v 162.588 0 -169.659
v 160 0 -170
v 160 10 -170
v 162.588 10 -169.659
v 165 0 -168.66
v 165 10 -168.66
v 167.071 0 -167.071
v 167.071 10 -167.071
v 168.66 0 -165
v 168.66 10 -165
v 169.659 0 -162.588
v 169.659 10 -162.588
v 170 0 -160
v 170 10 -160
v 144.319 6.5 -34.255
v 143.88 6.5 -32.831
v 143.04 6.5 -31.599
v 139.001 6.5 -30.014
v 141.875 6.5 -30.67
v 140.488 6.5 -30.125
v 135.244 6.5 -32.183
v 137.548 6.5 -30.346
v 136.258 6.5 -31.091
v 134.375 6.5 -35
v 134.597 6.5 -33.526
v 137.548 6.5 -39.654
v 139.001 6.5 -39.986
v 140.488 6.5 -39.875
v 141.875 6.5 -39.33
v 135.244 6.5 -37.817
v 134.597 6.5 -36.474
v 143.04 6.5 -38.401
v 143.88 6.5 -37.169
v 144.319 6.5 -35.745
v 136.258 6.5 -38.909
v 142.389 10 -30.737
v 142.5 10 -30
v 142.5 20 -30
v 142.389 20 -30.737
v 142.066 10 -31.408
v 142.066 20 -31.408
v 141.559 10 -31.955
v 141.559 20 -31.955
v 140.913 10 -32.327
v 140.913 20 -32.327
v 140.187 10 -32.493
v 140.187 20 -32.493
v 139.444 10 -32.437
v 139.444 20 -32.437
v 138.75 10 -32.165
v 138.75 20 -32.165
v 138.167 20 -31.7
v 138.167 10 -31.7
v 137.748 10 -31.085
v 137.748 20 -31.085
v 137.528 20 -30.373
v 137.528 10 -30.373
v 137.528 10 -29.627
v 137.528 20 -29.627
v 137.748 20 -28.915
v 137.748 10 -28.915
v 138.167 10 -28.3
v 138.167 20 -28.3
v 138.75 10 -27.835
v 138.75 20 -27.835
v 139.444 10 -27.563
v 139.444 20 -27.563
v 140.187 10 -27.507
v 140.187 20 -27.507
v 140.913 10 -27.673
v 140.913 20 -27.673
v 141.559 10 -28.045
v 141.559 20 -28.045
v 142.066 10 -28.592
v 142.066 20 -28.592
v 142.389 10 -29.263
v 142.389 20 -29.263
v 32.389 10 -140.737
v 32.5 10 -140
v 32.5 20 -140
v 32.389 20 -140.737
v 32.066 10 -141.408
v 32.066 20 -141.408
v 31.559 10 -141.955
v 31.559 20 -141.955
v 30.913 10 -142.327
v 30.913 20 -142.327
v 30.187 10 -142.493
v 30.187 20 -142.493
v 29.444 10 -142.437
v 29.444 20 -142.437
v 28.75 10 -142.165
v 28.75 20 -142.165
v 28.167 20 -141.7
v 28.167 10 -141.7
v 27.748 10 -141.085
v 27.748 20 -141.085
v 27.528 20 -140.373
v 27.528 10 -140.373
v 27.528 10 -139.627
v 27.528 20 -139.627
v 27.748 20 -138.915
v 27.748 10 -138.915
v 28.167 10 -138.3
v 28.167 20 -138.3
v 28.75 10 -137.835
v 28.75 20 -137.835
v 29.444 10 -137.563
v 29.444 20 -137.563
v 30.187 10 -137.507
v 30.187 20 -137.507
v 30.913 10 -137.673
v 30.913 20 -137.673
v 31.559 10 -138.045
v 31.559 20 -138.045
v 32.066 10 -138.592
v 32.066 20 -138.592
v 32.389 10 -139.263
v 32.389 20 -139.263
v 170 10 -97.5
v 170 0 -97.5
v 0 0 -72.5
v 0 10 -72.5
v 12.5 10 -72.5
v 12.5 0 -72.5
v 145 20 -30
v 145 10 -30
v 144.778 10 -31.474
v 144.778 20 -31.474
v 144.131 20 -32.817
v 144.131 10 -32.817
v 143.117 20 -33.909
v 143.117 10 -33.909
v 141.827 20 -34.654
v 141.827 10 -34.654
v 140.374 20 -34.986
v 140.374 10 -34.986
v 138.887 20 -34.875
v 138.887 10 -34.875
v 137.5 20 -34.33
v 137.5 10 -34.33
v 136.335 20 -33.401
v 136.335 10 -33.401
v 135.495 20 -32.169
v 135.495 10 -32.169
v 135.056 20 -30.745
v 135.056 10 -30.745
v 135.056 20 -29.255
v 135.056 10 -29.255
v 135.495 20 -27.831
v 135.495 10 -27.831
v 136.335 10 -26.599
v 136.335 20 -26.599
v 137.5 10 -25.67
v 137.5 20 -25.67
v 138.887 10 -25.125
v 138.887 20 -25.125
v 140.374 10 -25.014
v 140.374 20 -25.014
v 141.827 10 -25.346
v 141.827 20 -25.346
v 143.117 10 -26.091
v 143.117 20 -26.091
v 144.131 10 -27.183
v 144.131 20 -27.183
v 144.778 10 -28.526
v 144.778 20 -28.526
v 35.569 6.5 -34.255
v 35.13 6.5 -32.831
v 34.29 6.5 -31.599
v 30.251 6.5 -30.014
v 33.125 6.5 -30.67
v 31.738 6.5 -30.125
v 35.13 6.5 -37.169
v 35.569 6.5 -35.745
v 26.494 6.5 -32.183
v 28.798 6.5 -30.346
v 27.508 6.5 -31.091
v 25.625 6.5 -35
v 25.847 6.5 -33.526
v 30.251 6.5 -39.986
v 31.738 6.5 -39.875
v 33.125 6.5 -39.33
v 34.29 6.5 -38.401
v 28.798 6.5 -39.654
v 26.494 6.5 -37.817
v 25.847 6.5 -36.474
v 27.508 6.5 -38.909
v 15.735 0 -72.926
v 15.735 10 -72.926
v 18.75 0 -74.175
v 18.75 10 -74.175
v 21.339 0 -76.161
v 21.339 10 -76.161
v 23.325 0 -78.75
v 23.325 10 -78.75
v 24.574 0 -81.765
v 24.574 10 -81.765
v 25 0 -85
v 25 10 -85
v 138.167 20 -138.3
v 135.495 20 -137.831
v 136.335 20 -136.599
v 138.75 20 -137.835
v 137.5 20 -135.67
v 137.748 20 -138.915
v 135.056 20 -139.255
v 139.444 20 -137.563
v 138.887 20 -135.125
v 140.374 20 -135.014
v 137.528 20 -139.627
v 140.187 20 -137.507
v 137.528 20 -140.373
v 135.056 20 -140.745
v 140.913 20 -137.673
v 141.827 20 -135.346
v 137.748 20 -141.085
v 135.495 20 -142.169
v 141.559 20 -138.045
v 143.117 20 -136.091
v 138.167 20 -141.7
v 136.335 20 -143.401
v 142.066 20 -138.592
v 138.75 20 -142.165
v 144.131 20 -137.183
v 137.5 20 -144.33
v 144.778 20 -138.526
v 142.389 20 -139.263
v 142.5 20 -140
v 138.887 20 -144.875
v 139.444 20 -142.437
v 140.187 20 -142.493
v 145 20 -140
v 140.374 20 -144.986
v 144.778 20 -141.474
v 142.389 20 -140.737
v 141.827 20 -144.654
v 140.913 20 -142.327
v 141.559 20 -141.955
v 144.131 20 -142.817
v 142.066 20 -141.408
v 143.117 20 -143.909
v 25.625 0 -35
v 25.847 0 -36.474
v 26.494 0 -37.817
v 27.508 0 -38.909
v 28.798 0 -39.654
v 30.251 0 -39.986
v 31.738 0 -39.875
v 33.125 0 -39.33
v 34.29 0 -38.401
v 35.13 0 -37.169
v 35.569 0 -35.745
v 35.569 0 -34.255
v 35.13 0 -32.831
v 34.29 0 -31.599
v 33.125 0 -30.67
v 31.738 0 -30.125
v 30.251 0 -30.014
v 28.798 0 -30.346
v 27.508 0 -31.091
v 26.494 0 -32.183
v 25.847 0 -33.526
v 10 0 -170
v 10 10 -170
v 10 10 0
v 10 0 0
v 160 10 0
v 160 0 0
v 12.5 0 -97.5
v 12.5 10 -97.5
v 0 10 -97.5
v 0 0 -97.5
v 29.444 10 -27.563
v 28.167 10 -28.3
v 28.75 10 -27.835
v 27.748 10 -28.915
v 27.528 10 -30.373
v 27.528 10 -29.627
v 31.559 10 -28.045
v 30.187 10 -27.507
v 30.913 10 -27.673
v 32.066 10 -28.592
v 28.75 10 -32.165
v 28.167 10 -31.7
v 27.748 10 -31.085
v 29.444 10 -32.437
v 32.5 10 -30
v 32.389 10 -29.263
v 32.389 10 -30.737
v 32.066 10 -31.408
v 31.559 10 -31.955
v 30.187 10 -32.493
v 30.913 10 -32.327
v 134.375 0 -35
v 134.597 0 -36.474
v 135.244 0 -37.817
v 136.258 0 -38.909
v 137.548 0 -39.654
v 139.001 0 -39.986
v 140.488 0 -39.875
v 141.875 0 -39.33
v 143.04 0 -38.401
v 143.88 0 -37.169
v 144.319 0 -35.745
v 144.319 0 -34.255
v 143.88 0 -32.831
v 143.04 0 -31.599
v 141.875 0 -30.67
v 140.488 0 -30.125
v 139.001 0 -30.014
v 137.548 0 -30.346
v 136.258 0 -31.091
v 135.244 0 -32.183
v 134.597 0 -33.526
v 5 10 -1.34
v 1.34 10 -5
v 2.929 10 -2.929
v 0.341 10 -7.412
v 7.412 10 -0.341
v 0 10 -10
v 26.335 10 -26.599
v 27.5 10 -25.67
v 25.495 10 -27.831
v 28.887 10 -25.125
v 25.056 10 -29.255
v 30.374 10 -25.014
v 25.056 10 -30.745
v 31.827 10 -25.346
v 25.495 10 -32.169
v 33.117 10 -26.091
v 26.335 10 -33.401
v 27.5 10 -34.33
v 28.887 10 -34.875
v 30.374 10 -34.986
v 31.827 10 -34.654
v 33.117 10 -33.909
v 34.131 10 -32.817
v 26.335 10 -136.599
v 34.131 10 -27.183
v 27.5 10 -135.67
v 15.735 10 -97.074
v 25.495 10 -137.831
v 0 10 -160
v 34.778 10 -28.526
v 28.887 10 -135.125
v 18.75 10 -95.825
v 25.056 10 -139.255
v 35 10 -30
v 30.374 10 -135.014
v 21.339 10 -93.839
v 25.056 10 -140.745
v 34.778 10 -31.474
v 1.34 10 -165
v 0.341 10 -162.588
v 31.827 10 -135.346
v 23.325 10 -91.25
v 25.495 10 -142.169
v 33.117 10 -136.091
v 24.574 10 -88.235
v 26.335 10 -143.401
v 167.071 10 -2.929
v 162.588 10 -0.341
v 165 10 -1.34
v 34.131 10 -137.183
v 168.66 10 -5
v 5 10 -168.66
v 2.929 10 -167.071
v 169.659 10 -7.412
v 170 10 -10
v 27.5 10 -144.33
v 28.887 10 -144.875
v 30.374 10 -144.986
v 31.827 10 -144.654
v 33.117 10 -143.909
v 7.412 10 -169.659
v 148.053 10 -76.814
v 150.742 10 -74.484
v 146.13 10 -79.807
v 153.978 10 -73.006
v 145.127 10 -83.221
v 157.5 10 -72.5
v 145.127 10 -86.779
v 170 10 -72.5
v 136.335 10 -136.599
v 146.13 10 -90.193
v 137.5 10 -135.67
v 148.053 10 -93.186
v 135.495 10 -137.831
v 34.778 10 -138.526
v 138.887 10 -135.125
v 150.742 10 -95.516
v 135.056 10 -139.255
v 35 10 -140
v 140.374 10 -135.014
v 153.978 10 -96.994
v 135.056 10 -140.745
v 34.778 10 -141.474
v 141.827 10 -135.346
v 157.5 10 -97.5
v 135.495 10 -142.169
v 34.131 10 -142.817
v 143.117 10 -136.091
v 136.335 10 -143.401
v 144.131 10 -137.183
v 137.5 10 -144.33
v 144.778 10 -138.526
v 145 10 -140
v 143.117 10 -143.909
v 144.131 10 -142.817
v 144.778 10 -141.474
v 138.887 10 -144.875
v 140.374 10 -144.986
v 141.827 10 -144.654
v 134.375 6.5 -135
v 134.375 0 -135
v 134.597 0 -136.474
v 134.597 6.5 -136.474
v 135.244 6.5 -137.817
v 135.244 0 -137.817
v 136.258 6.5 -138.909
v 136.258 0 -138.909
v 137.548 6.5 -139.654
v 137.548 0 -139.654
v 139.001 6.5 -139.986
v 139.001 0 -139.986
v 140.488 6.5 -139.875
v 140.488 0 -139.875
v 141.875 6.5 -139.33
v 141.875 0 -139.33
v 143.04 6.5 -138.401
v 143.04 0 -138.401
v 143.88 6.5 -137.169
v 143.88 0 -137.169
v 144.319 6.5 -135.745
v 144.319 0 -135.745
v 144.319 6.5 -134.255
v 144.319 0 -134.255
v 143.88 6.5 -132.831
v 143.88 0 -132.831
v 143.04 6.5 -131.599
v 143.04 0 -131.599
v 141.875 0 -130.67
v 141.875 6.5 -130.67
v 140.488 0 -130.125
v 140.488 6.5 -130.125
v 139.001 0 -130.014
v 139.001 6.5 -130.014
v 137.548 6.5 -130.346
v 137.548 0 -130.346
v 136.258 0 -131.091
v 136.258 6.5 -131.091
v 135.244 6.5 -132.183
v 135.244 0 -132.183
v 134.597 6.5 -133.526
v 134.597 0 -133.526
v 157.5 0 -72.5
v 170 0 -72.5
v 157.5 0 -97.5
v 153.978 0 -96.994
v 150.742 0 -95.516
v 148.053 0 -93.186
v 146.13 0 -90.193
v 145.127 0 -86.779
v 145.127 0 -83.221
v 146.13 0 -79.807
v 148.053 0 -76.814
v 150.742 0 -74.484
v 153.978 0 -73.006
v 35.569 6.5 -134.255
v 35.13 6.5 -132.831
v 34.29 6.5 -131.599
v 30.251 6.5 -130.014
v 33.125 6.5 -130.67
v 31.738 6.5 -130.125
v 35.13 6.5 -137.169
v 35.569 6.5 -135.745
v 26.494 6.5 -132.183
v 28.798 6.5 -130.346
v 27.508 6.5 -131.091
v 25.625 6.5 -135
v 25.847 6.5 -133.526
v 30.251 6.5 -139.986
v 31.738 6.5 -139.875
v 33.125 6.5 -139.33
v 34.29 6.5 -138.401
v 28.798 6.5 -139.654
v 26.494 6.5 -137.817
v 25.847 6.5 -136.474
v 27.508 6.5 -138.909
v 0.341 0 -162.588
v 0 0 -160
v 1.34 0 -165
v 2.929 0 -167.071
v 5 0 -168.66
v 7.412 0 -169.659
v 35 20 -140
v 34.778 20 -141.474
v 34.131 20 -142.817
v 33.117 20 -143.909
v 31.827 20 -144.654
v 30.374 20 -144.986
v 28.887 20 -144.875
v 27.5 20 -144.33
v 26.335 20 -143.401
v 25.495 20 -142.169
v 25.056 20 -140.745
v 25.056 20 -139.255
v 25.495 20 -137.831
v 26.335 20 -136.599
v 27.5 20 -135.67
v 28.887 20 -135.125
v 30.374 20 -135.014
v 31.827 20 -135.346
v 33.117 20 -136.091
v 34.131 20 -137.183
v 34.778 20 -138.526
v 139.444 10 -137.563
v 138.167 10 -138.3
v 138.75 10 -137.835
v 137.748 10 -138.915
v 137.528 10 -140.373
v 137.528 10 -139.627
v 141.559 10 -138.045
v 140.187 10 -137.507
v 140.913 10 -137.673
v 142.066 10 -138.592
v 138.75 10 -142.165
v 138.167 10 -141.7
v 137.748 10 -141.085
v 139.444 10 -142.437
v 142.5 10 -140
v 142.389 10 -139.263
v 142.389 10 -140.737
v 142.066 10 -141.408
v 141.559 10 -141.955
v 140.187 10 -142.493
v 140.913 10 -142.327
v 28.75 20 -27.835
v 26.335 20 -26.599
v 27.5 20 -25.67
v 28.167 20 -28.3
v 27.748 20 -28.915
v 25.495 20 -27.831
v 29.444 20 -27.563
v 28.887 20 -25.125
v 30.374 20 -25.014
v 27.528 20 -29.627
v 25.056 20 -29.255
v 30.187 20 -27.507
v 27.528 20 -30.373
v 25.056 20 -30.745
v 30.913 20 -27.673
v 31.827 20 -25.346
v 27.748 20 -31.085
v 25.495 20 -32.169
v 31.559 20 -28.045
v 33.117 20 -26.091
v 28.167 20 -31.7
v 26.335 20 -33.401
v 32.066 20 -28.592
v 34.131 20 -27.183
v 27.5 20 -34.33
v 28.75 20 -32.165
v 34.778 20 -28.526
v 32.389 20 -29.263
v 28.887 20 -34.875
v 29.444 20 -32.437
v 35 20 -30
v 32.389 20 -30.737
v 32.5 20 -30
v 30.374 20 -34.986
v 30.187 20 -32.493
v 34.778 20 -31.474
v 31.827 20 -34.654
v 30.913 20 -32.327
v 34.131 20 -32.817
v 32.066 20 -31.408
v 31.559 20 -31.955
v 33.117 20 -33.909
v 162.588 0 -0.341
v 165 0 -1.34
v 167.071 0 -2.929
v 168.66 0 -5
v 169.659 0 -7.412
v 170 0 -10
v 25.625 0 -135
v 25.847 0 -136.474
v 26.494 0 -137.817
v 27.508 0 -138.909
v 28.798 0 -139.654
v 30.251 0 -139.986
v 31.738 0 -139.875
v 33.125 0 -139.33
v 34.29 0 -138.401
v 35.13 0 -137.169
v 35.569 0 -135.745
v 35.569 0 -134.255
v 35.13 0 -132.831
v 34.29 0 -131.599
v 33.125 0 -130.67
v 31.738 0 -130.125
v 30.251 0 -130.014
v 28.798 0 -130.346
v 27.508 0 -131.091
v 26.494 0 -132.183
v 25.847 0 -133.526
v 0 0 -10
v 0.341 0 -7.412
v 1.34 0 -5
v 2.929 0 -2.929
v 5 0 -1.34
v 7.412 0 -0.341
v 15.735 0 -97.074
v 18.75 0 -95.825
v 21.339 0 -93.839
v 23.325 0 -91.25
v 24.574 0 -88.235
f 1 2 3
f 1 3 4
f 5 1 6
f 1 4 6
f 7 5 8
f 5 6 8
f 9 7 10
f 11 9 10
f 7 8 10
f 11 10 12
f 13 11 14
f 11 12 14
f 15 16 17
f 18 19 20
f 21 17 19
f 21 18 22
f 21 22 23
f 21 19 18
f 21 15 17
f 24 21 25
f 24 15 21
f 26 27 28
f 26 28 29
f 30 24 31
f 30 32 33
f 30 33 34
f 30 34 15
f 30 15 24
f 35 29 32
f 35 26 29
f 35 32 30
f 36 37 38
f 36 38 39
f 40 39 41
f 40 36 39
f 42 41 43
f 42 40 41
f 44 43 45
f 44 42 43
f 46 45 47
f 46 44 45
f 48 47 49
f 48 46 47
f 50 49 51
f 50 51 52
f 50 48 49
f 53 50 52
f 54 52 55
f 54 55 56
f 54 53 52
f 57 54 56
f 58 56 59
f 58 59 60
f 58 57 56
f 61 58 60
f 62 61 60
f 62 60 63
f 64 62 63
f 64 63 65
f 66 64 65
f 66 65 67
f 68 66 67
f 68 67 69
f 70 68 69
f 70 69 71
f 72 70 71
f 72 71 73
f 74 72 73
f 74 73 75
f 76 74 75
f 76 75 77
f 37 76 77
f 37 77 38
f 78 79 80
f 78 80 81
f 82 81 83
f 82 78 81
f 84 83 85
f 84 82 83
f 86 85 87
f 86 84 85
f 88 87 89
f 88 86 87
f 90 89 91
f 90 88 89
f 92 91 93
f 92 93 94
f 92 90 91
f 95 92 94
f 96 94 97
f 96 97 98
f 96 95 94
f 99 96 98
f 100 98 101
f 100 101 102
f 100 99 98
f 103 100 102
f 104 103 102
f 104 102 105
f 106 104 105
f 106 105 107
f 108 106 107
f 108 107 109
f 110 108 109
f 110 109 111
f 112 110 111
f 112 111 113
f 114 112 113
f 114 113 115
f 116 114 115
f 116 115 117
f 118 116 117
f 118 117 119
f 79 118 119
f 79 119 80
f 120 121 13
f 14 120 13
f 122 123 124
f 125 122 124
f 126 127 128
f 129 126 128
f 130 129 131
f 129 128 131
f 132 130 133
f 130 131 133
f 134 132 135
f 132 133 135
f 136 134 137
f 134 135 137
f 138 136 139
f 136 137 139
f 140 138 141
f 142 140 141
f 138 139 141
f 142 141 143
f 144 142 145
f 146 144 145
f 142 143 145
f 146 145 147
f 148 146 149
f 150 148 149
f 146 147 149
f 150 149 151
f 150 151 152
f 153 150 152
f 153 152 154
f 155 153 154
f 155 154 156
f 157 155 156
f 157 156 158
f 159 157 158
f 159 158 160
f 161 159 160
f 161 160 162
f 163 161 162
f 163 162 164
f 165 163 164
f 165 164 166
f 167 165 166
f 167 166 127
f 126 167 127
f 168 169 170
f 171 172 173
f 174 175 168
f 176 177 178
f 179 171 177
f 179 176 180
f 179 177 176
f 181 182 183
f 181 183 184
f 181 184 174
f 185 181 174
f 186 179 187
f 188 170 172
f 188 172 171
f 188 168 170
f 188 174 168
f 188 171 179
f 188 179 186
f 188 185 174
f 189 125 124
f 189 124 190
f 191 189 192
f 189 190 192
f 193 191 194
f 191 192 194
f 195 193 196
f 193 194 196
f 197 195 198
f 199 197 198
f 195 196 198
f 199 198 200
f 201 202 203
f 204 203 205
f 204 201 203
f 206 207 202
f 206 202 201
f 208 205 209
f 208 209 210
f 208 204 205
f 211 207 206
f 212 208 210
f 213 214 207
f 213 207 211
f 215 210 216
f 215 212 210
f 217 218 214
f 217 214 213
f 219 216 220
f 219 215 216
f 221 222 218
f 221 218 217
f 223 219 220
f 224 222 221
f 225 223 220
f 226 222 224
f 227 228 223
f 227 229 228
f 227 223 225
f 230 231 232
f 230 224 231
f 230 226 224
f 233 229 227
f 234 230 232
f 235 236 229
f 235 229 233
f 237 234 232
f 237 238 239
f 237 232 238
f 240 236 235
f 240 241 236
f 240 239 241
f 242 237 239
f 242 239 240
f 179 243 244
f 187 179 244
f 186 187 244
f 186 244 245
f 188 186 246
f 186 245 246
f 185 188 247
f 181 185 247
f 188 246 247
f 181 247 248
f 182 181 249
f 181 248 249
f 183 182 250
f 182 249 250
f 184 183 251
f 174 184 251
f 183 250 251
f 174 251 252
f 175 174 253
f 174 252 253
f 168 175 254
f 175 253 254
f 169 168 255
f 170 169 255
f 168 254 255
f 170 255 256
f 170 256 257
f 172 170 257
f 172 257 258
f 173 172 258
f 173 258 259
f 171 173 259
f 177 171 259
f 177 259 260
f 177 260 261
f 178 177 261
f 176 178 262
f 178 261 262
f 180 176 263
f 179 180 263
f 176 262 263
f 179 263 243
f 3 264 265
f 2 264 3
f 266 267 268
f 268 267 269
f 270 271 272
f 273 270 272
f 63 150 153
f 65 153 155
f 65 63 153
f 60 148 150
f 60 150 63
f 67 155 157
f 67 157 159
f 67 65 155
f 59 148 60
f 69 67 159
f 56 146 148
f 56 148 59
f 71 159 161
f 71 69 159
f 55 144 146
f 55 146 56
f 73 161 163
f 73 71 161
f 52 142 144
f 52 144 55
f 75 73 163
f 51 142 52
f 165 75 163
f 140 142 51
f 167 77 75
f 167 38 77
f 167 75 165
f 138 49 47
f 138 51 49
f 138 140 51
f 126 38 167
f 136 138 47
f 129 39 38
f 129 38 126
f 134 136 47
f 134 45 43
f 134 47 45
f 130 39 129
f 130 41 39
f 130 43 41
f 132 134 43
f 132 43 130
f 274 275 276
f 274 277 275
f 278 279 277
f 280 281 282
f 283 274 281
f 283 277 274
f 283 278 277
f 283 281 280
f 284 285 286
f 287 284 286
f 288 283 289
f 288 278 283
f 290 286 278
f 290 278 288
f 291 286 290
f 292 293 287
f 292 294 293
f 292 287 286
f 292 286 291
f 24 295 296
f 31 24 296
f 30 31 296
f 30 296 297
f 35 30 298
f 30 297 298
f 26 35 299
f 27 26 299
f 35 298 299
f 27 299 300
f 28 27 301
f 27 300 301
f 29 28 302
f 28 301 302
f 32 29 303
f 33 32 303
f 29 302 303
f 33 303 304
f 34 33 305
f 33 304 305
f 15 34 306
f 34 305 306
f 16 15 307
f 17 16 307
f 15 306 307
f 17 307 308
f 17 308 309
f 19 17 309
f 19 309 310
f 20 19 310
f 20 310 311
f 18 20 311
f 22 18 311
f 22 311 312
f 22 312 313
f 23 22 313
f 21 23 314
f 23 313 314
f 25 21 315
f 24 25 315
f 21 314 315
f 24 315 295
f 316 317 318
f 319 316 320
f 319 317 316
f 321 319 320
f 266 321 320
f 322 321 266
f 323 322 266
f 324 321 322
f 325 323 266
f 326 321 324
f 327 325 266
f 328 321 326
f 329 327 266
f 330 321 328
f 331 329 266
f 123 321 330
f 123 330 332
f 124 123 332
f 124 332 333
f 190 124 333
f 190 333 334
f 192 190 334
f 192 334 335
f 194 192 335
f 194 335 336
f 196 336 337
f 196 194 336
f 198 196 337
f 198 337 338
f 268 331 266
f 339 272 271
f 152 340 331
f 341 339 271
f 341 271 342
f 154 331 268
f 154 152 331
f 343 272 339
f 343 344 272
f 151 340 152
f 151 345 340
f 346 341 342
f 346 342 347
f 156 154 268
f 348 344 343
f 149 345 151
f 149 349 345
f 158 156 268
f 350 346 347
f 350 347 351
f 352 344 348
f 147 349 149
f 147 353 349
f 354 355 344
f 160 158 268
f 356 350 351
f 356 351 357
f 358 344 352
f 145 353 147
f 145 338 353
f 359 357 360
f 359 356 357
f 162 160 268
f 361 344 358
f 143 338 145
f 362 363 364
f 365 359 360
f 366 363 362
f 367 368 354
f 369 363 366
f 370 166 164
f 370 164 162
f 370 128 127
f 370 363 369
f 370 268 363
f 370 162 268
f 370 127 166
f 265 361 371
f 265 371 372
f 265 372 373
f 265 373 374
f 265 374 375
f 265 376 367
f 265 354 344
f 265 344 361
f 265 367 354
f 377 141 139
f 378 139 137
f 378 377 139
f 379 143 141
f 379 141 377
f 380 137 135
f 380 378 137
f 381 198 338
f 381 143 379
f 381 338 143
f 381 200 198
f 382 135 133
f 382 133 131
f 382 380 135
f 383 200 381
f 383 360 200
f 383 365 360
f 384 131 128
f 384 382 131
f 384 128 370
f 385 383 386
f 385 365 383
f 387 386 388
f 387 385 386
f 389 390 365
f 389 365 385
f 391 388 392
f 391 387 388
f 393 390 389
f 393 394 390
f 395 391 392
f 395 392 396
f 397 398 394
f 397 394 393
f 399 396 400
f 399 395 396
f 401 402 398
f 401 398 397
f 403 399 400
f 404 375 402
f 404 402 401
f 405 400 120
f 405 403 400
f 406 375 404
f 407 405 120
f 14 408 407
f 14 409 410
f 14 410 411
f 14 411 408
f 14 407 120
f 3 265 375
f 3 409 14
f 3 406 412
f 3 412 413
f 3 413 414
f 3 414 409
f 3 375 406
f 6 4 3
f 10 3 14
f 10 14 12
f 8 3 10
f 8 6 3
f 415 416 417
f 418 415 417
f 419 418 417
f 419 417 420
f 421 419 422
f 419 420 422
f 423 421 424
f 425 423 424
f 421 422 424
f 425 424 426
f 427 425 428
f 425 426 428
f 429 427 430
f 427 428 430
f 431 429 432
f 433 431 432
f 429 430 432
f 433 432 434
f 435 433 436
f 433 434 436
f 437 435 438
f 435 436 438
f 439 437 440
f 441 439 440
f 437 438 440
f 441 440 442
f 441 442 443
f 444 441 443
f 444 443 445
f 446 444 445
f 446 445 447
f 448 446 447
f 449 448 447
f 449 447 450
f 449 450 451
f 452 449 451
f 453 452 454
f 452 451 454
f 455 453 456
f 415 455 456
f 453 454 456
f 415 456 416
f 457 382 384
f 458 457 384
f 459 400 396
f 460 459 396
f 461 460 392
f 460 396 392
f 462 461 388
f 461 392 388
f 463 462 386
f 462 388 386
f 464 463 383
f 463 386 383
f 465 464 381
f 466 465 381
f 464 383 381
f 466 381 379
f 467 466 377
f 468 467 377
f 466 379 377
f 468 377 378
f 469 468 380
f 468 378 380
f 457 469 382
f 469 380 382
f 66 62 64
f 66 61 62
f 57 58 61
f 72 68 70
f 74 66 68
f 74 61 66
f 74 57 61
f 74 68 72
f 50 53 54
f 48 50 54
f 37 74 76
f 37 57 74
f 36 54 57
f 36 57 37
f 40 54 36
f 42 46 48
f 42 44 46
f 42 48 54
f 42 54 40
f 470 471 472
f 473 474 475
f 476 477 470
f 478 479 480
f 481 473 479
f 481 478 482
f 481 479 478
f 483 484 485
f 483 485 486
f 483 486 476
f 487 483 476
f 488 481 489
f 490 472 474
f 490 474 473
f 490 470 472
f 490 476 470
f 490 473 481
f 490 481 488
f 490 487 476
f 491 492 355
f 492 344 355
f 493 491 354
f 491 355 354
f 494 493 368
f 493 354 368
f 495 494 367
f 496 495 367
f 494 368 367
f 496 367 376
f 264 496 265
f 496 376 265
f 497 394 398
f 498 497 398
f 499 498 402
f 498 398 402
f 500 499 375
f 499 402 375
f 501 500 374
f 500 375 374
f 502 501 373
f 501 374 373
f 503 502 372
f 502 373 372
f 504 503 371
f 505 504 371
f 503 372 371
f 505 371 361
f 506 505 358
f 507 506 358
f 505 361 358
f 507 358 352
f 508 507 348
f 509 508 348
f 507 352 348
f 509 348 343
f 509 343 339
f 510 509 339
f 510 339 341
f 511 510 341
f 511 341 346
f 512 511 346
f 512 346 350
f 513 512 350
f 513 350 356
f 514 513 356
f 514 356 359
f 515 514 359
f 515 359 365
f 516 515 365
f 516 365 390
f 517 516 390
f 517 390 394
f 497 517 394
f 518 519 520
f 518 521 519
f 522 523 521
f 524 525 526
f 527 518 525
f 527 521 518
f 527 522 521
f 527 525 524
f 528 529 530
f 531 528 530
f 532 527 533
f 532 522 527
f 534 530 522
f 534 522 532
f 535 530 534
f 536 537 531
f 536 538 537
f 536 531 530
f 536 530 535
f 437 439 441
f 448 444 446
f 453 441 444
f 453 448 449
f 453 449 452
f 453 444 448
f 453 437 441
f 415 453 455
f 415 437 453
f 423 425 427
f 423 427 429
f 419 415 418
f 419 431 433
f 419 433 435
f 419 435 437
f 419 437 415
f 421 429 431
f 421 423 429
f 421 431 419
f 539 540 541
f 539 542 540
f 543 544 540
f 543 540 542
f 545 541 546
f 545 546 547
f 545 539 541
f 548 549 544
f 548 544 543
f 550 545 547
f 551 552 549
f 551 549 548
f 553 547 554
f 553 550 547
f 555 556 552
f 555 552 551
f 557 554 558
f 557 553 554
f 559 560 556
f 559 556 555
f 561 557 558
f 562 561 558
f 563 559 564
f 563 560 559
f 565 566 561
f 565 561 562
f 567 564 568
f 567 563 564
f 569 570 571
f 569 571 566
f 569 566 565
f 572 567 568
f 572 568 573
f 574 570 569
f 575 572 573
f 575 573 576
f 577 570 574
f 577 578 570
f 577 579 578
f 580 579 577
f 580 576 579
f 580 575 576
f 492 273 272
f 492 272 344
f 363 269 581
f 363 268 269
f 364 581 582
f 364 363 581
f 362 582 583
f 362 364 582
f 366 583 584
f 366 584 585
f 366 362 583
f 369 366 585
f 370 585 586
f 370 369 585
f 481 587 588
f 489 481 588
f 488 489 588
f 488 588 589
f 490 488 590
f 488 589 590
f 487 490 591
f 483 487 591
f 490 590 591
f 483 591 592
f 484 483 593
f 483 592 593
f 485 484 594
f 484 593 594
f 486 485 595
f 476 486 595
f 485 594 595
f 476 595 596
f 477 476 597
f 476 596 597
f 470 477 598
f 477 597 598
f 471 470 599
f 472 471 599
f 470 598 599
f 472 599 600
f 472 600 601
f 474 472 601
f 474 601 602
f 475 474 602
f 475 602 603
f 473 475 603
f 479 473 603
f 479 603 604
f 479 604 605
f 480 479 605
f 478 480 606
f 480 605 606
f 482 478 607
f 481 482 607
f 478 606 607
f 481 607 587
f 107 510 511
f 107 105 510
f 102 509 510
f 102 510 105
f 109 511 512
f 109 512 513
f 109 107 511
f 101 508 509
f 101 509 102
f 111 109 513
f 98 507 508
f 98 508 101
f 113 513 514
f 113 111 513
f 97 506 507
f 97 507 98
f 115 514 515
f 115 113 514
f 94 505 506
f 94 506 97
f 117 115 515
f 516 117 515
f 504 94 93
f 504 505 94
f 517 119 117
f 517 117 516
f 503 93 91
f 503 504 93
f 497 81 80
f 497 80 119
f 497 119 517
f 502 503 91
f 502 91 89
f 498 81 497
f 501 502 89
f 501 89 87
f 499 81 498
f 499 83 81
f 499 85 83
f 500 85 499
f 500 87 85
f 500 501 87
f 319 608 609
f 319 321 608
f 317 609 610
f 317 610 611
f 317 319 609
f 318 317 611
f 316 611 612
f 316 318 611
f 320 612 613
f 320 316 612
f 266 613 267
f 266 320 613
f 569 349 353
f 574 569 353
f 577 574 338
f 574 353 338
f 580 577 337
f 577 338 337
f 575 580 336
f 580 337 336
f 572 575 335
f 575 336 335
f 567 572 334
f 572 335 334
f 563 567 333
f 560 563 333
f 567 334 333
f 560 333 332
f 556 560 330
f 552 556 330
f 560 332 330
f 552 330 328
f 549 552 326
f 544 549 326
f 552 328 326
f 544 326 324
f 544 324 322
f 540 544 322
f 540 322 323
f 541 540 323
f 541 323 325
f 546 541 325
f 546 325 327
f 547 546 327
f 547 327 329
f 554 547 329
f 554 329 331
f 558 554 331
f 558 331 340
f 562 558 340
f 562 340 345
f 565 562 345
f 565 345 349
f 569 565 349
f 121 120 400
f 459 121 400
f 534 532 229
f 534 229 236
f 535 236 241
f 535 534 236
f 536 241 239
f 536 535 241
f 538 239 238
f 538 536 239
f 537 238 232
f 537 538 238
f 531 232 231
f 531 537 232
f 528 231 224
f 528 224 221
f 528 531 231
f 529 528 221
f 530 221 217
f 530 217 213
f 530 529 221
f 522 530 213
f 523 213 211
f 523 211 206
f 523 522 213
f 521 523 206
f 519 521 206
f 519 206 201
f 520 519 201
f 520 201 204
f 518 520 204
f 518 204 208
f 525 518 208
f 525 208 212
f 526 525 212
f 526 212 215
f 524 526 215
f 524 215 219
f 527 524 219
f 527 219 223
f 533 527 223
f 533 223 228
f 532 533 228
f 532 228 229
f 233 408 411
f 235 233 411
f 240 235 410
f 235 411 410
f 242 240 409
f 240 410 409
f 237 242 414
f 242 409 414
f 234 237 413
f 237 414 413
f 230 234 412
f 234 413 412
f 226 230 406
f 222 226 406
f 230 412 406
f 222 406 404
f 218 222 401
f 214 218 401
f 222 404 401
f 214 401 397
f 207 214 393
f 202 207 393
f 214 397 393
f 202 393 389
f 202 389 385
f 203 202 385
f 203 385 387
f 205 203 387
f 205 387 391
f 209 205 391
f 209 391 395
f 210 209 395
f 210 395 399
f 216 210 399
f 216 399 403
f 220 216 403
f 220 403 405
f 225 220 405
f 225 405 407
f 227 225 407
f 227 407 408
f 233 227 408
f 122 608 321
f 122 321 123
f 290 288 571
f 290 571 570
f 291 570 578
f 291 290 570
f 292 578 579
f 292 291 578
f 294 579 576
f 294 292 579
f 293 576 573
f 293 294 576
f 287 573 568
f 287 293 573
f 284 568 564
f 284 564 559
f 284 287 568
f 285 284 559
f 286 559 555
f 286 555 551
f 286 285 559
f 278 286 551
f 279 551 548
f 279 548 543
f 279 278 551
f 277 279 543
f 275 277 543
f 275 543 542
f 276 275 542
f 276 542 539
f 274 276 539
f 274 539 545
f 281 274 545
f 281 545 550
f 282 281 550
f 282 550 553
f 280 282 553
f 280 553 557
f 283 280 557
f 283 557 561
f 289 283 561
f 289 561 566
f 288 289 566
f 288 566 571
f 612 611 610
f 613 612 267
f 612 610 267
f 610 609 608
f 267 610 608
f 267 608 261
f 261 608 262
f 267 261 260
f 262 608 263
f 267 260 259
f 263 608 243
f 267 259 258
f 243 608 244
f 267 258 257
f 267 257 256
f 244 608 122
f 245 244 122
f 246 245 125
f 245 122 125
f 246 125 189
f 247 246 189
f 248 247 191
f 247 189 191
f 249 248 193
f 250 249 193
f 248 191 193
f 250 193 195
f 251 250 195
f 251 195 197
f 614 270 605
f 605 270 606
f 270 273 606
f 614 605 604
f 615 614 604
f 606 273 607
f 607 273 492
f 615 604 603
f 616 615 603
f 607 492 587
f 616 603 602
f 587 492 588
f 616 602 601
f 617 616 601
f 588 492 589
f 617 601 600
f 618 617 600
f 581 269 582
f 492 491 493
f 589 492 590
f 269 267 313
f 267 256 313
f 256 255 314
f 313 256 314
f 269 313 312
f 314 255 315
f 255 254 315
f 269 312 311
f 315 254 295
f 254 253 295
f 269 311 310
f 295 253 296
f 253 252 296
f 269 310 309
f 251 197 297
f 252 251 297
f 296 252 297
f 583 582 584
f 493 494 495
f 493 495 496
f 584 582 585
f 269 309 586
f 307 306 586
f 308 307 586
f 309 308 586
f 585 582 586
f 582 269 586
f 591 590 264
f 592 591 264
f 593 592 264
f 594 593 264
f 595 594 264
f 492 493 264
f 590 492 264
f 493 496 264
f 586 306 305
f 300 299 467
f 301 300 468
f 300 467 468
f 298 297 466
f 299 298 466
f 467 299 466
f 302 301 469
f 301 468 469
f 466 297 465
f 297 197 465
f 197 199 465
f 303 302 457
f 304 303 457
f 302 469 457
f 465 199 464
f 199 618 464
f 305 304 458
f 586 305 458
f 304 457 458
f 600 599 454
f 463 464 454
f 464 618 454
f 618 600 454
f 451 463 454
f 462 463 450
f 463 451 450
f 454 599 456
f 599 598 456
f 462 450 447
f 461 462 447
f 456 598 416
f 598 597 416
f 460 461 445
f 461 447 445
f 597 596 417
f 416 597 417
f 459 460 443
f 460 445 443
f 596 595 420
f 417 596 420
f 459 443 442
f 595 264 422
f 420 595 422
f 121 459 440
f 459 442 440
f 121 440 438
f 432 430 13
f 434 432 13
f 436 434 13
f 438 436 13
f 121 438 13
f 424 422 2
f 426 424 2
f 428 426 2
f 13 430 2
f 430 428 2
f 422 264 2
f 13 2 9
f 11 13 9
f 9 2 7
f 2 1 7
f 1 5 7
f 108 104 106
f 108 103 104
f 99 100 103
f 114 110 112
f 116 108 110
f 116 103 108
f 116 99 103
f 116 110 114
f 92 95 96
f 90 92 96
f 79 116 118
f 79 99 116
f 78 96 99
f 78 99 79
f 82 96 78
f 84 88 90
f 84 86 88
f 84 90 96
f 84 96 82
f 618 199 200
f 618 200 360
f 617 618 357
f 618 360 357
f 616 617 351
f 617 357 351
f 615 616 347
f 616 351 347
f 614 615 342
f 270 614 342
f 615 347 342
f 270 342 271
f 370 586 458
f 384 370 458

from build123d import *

# Parameters (mm, degrees)
SKETCH2_W           = 170
SKETCH2_H           = 170
BOSS_EXTRUDE1_DEPTH = 10
SKETCH1_R           = 5
SKETCH1_R_2         = 2.5
BOSS_EXTRUDE2_DEPTH = 20
FILLET1_R           = 10
SKETCH3_R           = 5
CUT_EXTRUDE1_DEPTH  = 6.5
CUT_EXTRUDE2_DEPTH  = 11


with BuildPart() as part:
    # Sketch2 → Boss-Extrude1 (new body)
    with BuildSketch(Plane(origin=(0, 0, 0), x_dir=(1, 0, 0), z_dir=(0, 1, 0))):
        with Locations((85, 85)):
            Rectangle(SKETCH2_W, SKETCH2_H)
    extrude(amount=BOSS_EXTRUDE1_DEPTH)

    # Sketch1 → Boss-Extrude2 (add)
    with BuildSketch(Plane(origin=(0, 0, 0), x_dir=(1, 0, 0), z_dir=(0, 1, 0))):
        with Locations((30, 30)):
            Circle(SKETCH1_R)
        with Locations((30, 30)):
            Circle(SKETCH1_R_2, mode=Mode.SUBTRACT)
        with Locations((140, 30)):
            Circle(SKETCH1_R)
        with Locations((140, 30)):
            Circle(SKETCH1_R_2, mode=Mode.SUBTRACT)
        with Locations((30, 140)):
            Circle(SKETCH1_R)
        with Locations((30, 140)):
            Circle(SKETCH1_R_2, mode=Mode.SUBTRACT)
        with Locations((140, 140)):
            Circle(SKETCH1_R)
        with Locations((140, 140)):
            Circle(SKETCH1_R_2, mode=Mode.SUBTRACT)
    extrude(amount=BOSS_EXTRUDE2_DEPTH)

    # Fillet1
    fillet1_edges = [part.edges().sort_by_distance(p)[0] for p in [
        (0, 5, -170),
        (170, 5, -170),
        (170, 5, 0),
        (0, 5, 0),
    ]]
    fillet(fillet1_edges, radius=FILLET1_R)

    # Sketch3 → Cut-Extrude1 (cut)
    with BuildSketch(Plane(origin=(0, 0, 0), x_dir=(-1, 0, 0), z_dir=(0, -1, 0))):
        with Locations((-30.625, 135)):
            Circle(SKETCH3_R)
        with Locations((-139.375, 135)):
            Circle(SKETCH3_R)
        with Locations((-139.375, 35)):
            Circle(SKETCH3_R)
        with Locations((-30.625, 35)):
            Circle(SKETCH3_R)
    extrude(amount=-CUT_EXTRUDE1_DEPTH, mode=Mode.SUBTRACT)

    # Sketch4 → Cut-Extrude2 (cut, through all)
    with BuildSketch(Plane(origin=(0, 10, 0), x_dir=(1, 0, 0), z_dir=(0, 1, 0))):
        with BuildLine():
            ThreePointArc((25, 85), (21.338834765, 93.838834765), (12.5, 97.5))
            Line((12.5, 97.5), (0, 97.5))
            Line((0, 97.5), (0, 72.5))
            Line((0, 72.5), (12.5, 72.5))
            ThreePointArc((12.5, 72.5), (21.338834765, 76.161165235), (25, 85))
        make_face()
        with BuildLine():
            ThreePointArc((157.5, 97.5), (145, 85), (157.5, 72.5))
            Line((157.5, 72.5), (170, 72.5))
            Line((170, 72.5), (170, 97.5))
            Line((170, 97.5), (157.5, 97.5))
        make_face()
    extrude(amount=-CUT_EXTRUDE2_DEPTH, mode=Mode.SUBTRACT)


solid = part.part
